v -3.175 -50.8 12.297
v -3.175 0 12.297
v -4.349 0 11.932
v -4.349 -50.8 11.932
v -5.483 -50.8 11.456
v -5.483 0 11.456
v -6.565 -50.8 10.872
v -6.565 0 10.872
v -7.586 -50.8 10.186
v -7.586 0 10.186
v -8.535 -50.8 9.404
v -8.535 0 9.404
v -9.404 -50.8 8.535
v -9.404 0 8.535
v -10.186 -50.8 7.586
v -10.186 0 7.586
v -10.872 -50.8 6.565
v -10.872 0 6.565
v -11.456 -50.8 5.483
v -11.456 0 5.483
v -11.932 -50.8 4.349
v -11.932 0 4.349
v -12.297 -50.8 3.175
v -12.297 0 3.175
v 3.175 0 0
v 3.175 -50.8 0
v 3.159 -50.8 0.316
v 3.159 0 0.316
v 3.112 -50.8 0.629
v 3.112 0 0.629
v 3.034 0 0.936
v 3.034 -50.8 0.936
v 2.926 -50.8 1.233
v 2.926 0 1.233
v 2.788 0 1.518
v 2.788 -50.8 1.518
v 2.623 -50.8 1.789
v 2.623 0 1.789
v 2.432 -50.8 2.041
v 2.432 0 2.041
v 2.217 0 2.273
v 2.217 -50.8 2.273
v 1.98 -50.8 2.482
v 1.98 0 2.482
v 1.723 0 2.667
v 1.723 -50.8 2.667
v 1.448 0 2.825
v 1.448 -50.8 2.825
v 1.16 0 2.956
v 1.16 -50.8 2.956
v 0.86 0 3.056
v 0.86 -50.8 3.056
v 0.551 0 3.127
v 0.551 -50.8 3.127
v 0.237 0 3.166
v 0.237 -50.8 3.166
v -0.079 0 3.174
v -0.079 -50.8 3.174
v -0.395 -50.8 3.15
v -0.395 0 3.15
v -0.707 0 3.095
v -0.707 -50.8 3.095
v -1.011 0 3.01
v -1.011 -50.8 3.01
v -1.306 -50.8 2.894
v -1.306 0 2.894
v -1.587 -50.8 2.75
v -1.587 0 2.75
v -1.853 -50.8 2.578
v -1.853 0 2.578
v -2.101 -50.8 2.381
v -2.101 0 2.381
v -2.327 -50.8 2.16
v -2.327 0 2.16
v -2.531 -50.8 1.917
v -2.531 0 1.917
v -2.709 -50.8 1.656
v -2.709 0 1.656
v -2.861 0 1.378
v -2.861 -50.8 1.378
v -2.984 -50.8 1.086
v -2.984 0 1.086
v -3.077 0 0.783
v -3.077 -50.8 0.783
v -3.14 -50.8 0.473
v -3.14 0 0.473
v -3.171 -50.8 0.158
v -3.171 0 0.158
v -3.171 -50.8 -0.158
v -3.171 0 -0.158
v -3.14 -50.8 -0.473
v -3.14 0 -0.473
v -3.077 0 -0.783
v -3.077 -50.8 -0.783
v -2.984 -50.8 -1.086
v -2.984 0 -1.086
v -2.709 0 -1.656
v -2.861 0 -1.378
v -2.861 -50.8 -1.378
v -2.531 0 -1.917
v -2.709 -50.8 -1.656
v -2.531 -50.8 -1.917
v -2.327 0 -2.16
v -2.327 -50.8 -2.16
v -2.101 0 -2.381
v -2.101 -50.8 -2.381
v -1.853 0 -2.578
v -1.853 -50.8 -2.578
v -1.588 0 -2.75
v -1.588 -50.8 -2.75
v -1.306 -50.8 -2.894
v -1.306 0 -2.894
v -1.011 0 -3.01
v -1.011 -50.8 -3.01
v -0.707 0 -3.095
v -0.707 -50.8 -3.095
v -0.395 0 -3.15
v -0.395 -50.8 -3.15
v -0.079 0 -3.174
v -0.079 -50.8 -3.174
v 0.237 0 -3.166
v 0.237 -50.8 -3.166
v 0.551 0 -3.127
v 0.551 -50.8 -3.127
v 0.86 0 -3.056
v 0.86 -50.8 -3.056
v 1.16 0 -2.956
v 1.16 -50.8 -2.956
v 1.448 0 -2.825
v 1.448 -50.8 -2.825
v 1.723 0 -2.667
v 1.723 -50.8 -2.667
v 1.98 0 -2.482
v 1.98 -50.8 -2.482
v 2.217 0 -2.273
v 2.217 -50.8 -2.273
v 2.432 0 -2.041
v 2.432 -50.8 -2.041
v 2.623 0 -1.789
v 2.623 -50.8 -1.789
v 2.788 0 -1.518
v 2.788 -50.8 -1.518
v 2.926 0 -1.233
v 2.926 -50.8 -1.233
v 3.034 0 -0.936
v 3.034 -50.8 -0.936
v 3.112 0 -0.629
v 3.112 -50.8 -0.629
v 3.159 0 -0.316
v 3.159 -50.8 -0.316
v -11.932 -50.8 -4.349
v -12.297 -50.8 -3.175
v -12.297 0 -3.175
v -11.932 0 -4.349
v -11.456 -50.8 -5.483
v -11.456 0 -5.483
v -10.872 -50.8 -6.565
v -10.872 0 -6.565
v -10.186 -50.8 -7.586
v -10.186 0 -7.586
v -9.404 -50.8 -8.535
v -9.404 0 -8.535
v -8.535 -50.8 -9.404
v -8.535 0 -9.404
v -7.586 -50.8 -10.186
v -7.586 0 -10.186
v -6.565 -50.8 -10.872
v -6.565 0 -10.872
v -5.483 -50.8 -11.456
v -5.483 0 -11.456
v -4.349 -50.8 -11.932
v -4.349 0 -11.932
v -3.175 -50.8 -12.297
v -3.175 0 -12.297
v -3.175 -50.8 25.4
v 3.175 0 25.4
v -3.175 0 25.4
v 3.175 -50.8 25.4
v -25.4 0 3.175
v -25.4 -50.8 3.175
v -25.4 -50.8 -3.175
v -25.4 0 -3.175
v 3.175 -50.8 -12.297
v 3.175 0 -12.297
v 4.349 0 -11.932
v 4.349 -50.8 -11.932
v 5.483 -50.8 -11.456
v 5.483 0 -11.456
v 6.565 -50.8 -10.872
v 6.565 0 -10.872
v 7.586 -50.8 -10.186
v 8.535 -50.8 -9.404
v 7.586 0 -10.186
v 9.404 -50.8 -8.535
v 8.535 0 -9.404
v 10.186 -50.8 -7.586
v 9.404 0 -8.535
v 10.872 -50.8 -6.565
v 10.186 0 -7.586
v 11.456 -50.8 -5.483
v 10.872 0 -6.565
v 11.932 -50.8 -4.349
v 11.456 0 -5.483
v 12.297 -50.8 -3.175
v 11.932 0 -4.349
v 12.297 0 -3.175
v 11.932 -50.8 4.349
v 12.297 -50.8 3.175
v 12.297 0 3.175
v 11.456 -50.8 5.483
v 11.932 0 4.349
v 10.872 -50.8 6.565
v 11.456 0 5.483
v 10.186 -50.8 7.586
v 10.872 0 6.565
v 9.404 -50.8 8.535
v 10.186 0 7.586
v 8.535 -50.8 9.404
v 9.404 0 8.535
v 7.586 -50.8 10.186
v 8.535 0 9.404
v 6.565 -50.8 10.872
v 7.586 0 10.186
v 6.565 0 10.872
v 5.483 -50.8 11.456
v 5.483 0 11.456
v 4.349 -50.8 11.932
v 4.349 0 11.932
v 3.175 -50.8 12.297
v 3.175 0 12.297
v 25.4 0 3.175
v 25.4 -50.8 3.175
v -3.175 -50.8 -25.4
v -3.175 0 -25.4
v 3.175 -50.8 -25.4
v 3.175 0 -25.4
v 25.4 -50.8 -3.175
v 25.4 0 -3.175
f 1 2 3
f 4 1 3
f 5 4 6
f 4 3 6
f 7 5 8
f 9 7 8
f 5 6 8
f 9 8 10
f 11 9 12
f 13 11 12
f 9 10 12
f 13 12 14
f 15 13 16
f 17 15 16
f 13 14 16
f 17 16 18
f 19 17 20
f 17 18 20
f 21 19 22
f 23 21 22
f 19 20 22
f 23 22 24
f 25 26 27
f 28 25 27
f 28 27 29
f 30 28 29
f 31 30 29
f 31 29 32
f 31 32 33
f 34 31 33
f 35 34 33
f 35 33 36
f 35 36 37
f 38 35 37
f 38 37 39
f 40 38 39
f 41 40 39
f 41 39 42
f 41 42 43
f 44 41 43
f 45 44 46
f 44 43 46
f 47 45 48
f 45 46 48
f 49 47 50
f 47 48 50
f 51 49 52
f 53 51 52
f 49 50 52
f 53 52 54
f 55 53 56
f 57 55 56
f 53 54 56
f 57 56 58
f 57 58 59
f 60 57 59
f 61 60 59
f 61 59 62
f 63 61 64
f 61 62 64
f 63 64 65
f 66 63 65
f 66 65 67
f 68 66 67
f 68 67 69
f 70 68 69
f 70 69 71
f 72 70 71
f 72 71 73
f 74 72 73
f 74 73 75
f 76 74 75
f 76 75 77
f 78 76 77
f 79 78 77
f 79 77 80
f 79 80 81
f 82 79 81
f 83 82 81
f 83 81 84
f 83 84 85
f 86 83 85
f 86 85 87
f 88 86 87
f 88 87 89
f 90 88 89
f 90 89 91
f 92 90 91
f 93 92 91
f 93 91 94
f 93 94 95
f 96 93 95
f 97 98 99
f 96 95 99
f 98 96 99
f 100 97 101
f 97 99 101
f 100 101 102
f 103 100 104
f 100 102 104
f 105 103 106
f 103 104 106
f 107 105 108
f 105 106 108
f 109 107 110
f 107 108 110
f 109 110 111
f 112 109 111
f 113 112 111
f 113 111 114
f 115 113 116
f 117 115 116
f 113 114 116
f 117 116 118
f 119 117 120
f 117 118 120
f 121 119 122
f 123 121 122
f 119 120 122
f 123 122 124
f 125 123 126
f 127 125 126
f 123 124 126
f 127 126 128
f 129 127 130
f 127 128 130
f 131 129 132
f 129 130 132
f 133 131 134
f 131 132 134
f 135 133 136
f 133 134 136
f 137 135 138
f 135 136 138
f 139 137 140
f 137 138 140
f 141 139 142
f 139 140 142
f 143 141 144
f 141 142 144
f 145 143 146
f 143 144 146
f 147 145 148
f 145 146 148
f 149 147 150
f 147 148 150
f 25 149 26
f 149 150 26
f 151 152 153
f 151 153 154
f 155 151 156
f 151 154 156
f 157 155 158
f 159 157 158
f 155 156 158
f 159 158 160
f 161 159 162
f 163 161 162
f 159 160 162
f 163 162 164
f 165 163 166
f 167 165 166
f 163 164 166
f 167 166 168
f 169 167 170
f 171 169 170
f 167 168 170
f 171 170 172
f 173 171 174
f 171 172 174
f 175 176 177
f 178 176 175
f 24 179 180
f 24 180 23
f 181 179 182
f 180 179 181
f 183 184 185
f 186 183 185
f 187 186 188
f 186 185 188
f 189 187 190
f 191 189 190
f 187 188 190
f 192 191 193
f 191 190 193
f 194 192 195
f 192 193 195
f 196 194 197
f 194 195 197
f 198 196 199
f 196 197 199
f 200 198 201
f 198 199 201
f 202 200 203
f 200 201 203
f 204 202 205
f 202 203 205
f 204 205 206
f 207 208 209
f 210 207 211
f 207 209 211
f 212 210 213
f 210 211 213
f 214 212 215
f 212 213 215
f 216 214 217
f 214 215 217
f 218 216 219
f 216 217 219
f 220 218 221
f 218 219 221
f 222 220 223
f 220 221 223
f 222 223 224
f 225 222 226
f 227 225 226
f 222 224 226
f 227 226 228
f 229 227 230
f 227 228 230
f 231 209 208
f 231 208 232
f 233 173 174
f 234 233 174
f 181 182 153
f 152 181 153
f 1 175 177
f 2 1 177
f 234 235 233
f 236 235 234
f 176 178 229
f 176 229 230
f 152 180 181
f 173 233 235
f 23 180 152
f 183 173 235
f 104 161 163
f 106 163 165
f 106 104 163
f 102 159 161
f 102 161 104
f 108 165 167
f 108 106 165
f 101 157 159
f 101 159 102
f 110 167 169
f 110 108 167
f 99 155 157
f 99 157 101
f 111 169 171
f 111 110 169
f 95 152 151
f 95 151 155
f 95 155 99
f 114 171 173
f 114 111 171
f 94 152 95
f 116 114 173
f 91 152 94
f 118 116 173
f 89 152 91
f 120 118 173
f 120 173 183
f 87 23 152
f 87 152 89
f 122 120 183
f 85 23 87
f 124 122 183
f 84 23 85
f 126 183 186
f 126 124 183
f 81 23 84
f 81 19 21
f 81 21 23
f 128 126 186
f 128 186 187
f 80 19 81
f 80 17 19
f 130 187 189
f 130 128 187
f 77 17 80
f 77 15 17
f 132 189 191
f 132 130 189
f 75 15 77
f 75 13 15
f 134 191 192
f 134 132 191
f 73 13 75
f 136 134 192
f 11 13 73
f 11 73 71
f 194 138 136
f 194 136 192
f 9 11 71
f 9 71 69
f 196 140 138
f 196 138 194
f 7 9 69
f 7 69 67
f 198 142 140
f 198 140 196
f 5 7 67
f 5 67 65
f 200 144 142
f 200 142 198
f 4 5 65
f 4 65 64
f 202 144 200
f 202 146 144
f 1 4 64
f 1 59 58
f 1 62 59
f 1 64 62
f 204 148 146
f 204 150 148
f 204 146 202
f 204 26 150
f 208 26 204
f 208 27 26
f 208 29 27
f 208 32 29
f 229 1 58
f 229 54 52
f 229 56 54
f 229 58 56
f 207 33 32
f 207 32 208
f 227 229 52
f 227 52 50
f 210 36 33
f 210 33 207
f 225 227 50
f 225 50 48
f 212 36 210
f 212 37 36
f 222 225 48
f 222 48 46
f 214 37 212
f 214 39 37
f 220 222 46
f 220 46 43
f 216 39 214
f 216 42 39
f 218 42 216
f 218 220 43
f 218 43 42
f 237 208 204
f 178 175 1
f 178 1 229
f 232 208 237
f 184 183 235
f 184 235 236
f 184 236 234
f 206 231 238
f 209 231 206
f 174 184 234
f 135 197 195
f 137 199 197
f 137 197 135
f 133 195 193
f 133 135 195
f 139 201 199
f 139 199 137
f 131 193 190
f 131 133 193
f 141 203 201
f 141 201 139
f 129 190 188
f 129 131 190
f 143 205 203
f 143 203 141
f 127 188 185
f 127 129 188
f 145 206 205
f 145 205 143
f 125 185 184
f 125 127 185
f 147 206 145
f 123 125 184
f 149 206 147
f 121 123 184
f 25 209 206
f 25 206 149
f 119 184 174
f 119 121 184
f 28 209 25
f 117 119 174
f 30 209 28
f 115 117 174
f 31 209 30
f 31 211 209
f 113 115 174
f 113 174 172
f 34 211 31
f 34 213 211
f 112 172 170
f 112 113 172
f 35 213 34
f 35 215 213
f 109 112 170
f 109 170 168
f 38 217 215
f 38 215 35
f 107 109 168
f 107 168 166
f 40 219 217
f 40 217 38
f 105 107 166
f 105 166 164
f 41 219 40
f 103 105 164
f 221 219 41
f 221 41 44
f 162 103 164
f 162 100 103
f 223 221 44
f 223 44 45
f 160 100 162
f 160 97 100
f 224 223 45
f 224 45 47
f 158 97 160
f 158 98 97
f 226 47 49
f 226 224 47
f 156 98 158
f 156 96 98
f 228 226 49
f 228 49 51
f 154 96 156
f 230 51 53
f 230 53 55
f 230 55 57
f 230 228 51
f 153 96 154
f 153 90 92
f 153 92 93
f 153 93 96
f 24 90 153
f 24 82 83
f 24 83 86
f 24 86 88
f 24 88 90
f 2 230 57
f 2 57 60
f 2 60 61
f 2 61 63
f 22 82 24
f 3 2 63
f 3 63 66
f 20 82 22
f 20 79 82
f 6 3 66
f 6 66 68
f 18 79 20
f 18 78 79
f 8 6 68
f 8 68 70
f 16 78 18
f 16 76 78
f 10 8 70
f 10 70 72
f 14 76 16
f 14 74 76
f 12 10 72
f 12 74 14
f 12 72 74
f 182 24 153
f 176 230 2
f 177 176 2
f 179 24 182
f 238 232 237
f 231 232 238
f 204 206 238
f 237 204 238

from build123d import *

# Parameters (mm, degrees)
F0_R     = 12.7
F1_DEPTH = 50.8
F3_DEPTH = 3.175
F5_DEPTH = 3.175
F7_D     = 6.35


with BuildPart() as f1:
    # F0 (on Front) → F1 (new body)
    with BuildSketch(Plane.XZ):
        Circle(F0_R)
    extrude(amount=F1_DEPTH)

    # F2 (on Right) → F3 (join, symmetric)
    with BuildSketch(Plane.YZ):
        Polygon((0, 0), (0, 25.4), (-50.8, 25.4), (-50.8, -25.4), (0, -25.4), align=None)
    extrude(amount=F3_DEPTH, both=True)

    # F4 (on Top) → F5 (join, symmetric)
    with BuildSketch(Plane.XY):
        Polygon((0, 0), (-25.4, 0), (-25.4, -50.8), (25.4, -50.8), (25.4, 0), align=None)
    extrude(amount=F5_DEPTH, both=True)

    # F7 (through all)
    with Locations(Plane(origin=(0, 0, 0), x_dir=(-1, 0, 0), z_dir=(0, 1, 0))):
        with Locations((0, 0)):
            Hole(F7_D / 2)


solid = f1.part
